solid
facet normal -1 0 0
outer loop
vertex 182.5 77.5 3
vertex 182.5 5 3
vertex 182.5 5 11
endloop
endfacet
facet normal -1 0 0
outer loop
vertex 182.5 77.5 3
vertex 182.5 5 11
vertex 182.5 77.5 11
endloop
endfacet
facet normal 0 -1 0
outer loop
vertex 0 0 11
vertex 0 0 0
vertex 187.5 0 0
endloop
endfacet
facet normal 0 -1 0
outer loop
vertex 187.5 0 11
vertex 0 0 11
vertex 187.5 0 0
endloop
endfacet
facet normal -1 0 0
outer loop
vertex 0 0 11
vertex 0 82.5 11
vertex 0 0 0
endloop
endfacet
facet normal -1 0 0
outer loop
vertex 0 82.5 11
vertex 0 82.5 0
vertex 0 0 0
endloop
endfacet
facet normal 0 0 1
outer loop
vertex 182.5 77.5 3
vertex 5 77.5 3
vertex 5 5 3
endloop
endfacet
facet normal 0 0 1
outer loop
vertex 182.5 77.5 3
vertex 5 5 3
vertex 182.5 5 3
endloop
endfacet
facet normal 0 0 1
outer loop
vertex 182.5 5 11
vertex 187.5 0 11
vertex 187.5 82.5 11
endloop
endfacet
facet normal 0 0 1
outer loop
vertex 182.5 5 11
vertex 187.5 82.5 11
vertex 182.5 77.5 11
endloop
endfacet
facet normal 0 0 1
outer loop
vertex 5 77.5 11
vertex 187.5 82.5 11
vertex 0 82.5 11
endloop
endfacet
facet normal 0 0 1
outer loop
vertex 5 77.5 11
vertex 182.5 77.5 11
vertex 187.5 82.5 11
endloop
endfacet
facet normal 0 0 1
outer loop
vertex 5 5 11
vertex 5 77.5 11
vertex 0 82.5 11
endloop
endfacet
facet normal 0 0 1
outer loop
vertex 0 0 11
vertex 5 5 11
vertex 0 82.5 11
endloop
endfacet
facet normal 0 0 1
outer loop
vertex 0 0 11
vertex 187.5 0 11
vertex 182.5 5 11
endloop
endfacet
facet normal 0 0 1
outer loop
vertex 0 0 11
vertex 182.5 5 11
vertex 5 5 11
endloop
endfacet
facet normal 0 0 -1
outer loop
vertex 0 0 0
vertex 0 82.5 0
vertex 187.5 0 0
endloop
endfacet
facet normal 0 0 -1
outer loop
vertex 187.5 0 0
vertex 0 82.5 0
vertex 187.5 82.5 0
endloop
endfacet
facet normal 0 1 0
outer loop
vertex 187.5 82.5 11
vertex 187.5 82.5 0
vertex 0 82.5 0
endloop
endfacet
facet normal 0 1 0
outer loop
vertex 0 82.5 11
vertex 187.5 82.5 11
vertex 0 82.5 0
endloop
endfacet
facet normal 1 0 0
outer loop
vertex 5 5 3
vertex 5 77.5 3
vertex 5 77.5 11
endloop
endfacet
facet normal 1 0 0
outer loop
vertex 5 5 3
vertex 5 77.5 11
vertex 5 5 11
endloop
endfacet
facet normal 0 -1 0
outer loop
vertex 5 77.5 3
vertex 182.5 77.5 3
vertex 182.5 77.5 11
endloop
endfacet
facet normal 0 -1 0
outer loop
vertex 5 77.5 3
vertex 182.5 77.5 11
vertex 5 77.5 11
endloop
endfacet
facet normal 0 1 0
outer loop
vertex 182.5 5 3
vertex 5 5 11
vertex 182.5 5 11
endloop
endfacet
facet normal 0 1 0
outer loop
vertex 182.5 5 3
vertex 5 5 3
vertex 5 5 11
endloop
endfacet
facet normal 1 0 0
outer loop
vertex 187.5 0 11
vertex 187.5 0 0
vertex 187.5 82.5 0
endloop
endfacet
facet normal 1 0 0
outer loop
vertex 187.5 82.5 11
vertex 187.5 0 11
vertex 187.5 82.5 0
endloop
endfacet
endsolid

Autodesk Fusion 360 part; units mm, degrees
sketch "Sketch1" plane through (0, 0, 0) normal (0, 0, 1) x (1, 0, 0)
  line L0 (0, 0) -> (187.5, 0)
  line L1 (187.5, 0) -> (187.5, 82.5)
  line L2 (187.5, 82.5) -> (0, 82.5)
  line L3 (0, 82.5) -> (0, 0)
  dimension "d1" = 187.5
  dimension "d2" = 82.5
extrude "Extrude1" add sketch "Sketch1" along normal blind 3
sketch "Sketch2" plane through (0, 0, 3) normal (0, 0, 1) x (-1, 0, 0)
  line L0 (0, -82.5) -> (0, 0)
  line L1 (0, 0) -> (-187.5, 0)
  line L2 (-187.5, 0) -> (-187.5, -82.5)
  line L3 (-187.5, -82.5) -> (0, -82.5)
  line L4 (-5, -5) -> (-182.5, -5)
  line L5 (-182.5, -5) -> (-182.5, -77.5)
  line L6 (-182.5, -77.5) -> (-5, -77.5)
  line L7 (-5, -77.5) -> (-5, -5)
  dimension "d5" = -5
extrude "Extrude2" add sketch "Sketch2" along normal blind 8
